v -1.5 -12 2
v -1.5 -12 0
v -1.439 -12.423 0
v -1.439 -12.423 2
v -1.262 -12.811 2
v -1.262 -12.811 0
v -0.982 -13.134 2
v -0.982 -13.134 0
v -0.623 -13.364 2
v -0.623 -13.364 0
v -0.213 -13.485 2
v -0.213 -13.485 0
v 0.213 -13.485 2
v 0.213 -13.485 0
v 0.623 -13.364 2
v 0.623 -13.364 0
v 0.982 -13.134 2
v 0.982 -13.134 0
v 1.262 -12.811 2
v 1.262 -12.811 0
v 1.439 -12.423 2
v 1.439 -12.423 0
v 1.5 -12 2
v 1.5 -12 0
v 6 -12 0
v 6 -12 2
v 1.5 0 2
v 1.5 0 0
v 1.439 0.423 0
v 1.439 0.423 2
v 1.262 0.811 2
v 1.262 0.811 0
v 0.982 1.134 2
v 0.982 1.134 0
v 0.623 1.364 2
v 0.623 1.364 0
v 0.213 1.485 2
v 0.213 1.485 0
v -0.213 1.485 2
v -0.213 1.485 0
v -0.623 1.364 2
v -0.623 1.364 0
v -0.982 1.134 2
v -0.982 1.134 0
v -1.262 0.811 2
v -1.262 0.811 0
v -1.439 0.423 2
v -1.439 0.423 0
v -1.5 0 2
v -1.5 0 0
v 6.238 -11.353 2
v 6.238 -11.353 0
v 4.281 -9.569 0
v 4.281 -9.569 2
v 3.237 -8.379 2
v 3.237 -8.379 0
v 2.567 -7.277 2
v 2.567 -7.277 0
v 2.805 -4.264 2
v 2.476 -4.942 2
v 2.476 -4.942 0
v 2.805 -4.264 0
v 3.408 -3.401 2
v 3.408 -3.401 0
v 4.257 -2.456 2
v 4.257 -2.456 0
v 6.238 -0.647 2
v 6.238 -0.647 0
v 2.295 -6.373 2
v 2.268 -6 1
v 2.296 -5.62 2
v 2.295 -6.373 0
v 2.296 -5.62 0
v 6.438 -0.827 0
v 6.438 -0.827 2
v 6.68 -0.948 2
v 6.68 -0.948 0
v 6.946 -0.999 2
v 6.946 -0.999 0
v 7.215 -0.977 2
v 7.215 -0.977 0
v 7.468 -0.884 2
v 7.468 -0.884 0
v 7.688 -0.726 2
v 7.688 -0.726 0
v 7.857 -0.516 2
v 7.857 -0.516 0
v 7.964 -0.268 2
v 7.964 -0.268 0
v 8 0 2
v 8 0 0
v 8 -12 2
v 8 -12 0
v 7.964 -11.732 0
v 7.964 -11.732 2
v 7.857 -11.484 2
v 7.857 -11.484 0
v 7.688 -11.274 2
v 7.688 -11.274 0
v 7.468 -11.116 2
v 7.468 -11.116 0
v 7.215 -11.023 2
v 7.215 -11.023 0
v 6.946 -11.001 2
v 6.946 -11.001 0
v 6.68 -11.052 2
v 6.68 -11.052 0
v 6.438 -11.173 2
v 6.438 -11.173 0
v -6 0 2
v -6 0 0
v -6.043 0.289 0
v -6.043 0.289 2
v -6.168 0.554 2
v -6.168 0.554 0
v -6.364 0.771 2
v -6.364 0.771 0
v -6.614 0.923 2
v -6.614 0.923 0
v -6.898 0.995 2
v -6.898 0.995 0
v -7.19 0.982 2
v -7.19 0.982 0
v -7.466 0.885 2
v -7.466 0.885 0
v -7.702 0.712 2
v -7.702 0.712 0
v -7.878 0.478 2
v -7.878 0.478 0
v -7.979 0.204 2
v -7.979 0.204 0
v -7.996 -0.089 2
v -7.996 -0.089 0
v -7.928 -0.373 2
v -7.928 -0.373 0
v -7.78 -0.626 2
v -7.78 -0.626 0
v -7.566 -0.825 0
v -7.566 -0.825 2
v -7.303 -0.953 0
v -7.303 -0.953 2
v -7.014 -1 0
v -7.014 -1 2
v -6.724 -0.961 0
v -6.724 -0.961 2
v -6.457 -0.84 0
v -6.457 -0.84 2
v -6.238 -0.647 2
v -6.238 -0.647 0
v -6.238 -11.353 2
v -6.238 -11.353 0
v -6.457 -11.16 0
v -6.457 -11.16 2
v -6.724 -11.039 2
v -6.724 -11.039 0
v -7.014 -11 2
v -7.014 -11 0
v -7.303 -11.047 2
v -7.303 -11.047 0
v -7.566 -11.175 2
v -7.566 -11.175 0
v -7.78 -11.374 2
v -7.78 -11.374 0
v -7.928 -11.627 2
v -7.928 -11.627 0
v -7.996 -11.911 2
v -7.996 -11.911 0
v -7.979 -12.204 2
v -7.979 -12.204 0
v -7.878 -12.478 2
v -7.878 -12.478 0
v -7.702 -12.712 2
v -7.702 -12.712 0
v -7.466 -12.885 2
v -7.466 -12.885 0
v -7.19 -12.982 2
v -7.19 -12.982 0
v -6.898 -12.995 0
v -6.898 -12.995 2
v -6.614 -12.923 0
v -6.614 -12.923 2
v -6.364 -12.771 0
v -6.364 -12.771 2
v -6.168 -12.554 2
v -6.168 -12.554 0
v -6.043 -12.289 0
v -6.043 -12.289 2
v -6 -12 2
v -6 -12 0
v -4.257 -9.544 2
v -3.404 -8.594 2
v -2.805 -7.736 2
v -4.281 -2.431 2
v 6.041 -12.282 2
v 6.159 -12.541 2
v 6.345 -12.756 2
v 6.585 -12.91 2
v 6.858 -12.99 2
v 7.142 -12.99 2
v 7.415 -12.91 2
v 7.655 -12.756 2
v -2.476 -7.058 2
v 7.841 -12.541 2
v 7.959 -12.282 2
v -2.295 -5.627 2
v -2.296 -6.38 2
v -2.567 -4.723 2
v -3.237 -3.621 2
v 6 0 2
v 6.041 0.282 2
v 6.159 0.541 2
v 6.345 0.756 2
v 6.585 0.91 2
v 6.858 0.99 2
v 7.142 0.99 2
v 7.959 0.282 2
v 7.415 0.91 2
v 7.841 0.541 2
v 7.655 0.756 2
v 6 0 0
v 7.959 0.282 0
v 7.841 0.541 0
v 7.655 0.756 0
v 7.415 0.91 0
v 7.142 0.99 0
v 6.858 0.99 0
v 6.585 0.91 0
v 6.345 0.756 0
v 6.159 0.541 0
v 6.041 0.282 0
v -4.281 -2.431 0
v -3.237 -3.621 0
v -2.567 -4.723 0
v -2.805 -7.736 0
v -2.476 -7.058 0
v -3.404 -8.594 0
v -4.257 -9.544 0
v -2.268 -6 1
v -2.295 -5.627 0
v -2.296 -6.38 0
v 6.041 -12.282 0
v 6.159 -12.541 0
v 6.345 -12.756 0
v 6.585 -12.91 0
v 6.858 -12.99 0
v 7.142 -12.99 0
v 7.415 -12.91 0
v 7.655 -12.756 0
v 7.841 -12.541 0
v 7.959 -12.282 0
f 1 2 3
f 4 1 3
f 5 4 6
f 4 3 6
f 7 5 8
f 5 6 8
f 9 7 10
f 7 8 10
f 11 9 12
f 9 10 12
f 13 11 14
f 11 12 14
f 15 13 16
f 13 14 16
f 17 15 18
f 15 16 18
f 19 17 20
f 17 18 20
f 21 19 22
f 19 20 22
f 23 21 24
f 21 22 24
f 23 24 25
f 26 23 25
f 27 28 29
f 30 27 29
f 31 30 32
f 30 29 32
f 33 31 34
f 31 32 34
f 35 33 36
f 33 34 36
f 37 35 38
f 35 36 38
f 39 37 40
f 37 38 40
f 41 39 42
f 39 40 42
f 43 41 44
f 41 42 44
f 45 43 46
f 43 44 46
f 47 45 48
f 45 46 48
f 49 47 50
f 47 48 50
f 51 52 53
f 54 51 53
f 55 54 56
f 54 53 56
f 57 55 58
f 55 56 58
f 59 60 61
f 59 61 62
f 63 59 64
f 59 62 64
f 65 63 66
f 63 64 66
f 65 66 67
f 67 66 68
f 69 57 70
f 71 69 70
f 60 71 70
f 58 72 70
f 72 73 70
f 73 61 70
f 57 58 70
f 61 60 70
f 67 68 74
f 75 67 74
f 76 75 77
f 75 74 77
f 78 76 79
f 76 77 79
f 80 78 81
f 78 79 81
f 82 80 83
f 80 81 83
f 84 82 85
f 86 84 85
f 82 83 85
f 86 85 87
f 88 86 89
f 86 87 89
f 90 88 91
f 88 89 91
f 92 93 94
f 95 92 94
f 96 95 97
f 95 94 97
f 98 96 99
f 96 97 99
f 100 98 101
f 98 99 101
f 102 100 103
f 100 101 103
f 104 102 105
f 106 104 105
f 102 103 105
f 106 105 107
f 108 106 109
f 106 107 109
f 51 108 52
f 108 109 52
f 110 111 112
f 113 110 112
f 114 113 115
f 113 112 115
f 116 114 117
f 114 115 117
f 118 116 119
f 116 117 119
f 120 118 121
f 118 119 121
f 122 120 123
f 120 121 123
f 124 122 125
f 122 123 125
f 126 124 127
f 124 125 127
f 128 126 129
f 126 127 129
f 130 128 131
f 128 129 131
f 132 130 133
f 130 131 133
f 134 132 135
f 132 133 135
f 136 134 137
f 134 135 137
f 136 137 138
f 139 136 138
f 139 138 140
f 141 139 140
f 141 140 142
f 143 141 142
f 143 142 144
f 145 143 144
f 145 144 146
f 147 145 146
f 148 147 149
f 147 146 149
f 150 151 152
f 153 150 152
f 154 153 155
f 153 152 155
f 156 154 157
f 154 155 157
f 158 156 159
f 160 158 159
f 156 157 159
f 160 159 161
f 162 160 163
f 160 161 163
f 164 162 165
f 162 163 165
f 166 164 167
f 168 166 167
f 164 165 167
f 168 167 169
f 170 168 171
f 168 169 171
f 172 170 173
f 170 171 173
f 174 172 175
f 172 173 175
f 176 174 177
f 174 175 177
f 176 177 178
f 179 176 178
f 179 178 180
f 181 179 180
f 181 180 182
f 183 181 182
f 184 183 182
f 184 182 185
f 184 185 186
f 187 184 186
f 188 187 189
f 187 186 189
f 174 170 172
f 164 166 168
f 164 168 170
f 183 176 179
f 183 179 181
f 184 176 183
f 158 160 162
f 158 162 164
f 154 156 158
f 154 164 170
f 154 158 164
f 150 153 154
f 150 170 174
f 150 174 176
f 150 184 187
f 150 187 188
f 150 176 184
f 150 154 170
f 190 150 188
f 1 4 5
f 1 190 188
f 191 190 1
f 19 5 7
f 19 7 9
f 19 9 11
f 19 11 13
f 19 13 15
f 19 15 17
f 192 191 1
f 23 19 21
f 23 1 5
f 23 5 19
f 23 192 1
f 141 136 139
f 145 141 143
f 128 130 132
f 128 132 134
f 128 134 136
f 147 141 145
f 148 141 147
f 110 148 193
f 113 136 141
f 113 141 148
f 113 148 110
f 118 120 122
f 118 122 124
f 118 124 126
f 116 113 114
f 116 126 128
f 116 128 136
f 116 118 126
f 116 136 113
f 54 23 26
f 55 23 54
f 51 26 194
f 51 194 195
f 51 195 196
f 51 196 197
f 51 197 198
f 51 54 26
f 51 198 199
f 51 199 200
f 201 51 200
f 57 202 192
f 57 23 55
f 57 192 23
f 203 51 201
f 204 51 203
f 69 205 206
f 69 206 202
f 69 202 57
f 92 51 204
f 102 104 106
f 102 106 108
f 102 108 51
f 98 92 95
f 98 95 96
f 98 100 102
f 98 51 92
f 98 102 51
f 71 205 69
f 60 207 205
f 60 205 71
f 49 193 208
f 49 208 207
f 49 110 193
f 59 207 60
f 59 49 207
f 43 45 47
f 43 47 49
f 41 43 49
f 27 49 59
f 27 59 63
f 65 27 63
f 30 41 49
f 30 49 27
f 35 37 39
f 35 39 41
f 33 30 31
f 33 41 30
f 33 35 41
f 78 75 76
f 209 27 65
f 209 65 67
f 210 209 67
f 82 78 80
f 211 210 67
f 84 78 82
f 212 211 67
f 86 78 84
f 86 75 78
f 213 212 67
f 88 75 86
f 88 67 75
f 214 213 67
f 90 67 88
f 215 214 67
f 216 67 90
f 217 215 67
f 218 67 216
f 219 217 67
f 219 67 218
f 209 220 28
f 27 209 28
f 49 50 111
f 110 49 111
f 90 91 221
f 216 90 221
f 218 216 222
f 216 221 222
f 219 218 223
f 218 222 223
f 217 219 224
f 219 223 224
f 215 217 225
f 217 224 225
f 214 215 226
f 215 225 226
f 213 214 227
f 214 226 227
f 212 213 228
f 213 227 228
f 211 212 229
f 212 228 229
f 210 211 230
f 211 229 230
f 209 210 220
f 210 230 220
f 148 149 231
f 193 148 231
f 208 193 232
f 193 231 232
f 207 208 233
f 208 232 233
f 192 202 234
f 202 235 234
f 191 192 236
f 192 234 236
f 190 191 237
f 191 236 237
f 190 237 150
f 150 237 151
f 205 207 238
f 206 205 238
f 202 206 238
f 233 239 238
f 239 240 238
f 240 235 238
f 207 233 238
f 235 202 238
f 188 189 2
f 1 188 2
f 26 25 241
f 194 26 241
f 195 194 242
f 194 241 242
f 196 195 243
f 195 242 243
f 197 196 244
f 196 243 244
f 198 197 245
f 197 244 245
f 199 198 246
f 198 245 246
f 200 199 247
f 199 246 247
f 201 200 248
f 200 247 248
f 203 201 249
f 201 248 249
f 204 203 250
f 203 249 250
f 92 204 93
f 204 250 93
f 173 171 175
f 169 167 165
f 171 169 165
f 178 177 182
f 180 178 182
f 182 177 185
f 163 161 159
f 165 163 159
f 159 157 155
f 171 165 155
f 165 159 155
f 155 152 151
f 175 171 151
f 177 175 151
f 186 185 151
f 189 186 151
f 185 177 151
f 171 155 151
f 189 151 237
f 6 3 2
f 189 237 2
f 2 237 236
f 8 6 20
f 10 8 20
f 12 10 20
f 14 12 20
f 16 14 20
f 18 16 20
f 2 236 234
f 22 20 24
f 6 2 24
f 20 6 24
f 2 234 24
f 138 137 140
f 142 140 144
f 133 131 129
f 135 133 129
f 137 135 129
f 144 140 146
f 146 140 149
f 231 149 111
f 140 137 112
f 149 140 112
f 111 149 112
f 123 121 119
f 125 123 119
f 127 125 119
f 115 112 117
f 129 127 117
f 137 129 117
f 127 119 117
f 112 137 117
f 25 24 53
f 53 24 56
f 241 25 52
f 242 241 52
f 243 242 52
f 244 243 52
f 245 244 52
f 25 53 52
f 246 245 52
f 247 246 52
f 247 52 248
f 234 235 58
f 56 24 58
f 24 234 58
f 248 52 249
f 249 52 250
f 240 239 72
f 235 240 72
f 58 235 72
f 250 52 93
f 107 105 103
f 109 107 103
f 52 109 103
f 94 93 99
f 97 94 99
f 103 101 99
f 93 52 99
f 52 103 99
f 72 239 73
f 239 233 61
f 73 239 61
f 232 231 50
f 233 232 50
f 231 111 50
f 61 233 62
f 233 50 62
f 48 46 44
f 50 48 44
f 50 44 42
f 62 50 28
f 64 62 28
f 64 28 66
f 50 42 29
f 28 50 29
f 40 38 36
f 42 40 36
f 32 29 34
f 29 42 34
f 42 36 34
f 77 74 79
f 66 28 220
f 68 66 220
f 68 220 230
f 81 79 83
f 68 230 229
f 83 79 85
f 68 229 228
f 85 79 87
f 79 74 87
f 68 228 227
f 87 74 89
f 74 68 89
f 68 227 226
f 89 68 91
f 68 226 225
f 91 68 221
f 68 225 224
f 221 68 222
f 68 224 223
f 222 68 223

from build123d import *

# Parameters (mm, degrees)
F1_DEPTH = 2


with BuildPart() as f1:
    # F0 (on Top) → F1 (new body)
    with BuildSketch(Plane.XY):
        with BuildLine():
            add(Edge.make_bspline(
                [(-6.237544, -0.64704), (-6.489718, -0.43136), (-6.744859, -0.21568), (-7, 0)],
                knots=[14.458679, 14.458679, 14.458679, 14.458679, 15.282723, 15.282723, 15.282723, 15.282723], degree=3))
            Line((-7, 0), (-6, 0))
            ThreePointArc((-6, 0), (-7.938738, 0.344633), (-6.237544, -0.64704))
        make_face()
        with BuildLine():
            Line((-6, 0), (-7, 0))
            add(Edge.make_bspline(
                [(-6.237544, -0.64704), (-6.489718, -0.43136), (-6.744859, -0.21568), (-7, 0)],
                knots=[14.458679, 14.458679, 14.458679, 14.458679, 15.282723, 15.282723, 15.282723, 15.282723], degree=3))
            ThreePointArc((-6.237544, -0.64704), (-6.061262, -0.344633), (-6, 0))
        make_face()
        with BuildLine():
            Line((-1.5, 0), (-6, 0))
            ThreePointArc((-6, 0), (-6.061262, -0.344633), (-6.237544, -0.64704))
            add(Edge.make_bspline(
                [(-2.26815, -6), (-2.26815, -4.21568), (-4.151307, -2.43136), (-6.237544, -0.64704)],
                knots=[7.641361, 7.641361, 7.641361, 7.641361, 14.458679, 14.458679, 14.458679, 14.458679], degree=3))
            Line((-2.26815, -6), (0, -6))
            Line((0, -6), (0, 0))
            Line((0, 0), (-1.5, 0))
        make_face()
        with BuildLine():
            ThreePointArc((1.5, 0), (0, 1.5), (-1.5, 0))
            Line((-1.5, 0), (0, 0))
            Line((0, 0), (1.5, 0))
        make_face()
        with BuildLine():
            Line((1.5, 0), (0, 0))
            Line((0, 0), (0, -6))
            Line((0, -6), (2.26815, -6))
            add(Edge.make_bspline(
                [(2.26815, -6), (2.26815, -4.21568), (4.151307, -2.43136), (6.237544, -0.64704)],
                knots=[7.641361, 7.641361, 7.641361, 7.641361, 14.458679, 14.458679, 14.458679, 14.458679], degree=3))
            ThreePointArc((6.237544, -0.64704), (6.061262, -0.344633), (6, 0))
            Line((6, 0), (1.5, 0))
        make_face()
        with BuildLine():
            Line((7, 0), (6, 0))
            ThreePointArc((6, 0), (6.061262, -0.344633), (6.237544, -0.64704))
            add(Edge.make_bspline(
                [(6.237544, -0.64704), (6.489718, -0.43136), (6.744859, -0.21568), (7, 0)],
                knots=[14.458679, 14.458679, 14.458679, 14.458679, 15.282723, 15.282723, 15.282723, 15.282723], degree=3))
        make_face()
        with BuildLine():
            ThreePointArc((8, 0), (7, 1), (6, 0))
            Line((6, 0), (7, 0))
            add(Edge.make_bspline(
                [(6.237544, -0.64704), (6.489718, -0.43136), (6.744859, -0.21568), (7, 0)],
                knots=[14.458679, 14.458679, 14.458679, 14.458679, 15.282723, 15.282723, 15.282723, 15.282723], degree=3))
            ThreePointArc((6.237544, -0.64704), (7.344633, -0.938738), (8, 0))
        make_face()
        with BuildLine():
            Line((0, -6), (-2.26815, -6))
            add(Edge.make_bspline(
                [(-6.237544, -11.35296), (-4.151307, -9.56864), (-2.26815, -7.78432), (-2.26815, -6)],
                knots=[0.824044, 0.824044, 0.824044, 0.824044, 7.641361, 7.641361, 7.641361, 7.641361], degree=3))
            ThreePointArc((-6.237544, -11.35296), (-6.061262, -11.655367), (-6, -12))
            Line((-6, -12), (-1.5, -12))
            Line((-1.5, -12), (0, -12))
            Line((0, -12), (0, -6))
        make_face()
        with BuildLine():
            Line((2.26815, -6), (0, -6))
            Line((0, -6), (0, -12))
            Line((0, -12), (1.5, -12))
            Line((1.5, -12), (6, -12))
            ThreePointArc((6, -12), (6.061262, -11.655367), (6.237544, -11.35296))
            add(Edge.make_bspline(
                [(6.237544, -11.35296), (4.151307, -9.56864), (2.26815, -7.78432), (2.26815, -6)],
                knots=[0.824044, 0.824044, 0.824044, 0.824044, 7.641361, 7.641361, 7.641361, 7.641361], degree=3))
        make_face()
        with BuildLine():
            ThreePointArc((-6, -12), (-6.061262, -11.655367), (-6.237544, -11.35296))
            add(Edge.make_bspline(
                [(-7, -12), (-6.744859, -11.78432), (-6.489718, -11.56864), (-6.237544, -11.35296)],
                knots=[0, 0, 0, 0, 0.824044, 0.824044, 0.824044, 0.824044], degree=3))
            Line((-7, -12), (-6, -12))
        make_face()
        with BuildLine():
            add(Edge.make_bspline(
                [(-7, -12), (-6.744859, -11.78432), (-6.489718, -11.56864), (-6.237544, -11.35296)],
                knots=[0, 0, 0, 0, 0.824044, 0.824044, 0.824044, 0.824044], degree=3))
            ThreePointArc((-6.237544, -11.35296), (-7.938738, -12.344633), (-6, -12))
            Line((-6, -12), (-7, -12))
        make_face()
        with BuildLine():
            Line((1.5, -12), (0, -12))
            Line((0, -12), (-1.5, -12))
            ThreePointArc((-1.5, -12), (0, -13.5), (1.5, -12))
        make_face()
        with BuildLine():
            add(Edge.make_bspline(
                [(7, -12), (6.744859, -11.78432), (6.489718, -11.56864), (6.237544, -11.35296)],
                knots=[0, 0, 0, 0, 0.824044, 0.824044, 0.824044, 0.824044], degree=3))
            ThreePointArc((6.237544, -11.35296), (6.061262, -11.655367), (6, -12))
            Line((6, -12), (7, -12))
        make_face()
        with BuildLine():
            ThreePointArc((8, -12), (7.344633, -11.061262), (6.237544, -11.35296))
            add(Edge.make_bspline(
                [(7, -12), (6.744859, -11.78432), (6.489718, -11.56864), (6.237544, -11.35296)],
                knots=[0, 0, 0, 0, 0.824044, 0.824044, 0.824044, 0.824044], degree=3))
            Line((7, -12), (6, -12))
            ThreePointArc((6, -12), (7, -13), (8, -12))
        make_face()
    extrude(amount=F1_DEPTH)


solid = f1.part
